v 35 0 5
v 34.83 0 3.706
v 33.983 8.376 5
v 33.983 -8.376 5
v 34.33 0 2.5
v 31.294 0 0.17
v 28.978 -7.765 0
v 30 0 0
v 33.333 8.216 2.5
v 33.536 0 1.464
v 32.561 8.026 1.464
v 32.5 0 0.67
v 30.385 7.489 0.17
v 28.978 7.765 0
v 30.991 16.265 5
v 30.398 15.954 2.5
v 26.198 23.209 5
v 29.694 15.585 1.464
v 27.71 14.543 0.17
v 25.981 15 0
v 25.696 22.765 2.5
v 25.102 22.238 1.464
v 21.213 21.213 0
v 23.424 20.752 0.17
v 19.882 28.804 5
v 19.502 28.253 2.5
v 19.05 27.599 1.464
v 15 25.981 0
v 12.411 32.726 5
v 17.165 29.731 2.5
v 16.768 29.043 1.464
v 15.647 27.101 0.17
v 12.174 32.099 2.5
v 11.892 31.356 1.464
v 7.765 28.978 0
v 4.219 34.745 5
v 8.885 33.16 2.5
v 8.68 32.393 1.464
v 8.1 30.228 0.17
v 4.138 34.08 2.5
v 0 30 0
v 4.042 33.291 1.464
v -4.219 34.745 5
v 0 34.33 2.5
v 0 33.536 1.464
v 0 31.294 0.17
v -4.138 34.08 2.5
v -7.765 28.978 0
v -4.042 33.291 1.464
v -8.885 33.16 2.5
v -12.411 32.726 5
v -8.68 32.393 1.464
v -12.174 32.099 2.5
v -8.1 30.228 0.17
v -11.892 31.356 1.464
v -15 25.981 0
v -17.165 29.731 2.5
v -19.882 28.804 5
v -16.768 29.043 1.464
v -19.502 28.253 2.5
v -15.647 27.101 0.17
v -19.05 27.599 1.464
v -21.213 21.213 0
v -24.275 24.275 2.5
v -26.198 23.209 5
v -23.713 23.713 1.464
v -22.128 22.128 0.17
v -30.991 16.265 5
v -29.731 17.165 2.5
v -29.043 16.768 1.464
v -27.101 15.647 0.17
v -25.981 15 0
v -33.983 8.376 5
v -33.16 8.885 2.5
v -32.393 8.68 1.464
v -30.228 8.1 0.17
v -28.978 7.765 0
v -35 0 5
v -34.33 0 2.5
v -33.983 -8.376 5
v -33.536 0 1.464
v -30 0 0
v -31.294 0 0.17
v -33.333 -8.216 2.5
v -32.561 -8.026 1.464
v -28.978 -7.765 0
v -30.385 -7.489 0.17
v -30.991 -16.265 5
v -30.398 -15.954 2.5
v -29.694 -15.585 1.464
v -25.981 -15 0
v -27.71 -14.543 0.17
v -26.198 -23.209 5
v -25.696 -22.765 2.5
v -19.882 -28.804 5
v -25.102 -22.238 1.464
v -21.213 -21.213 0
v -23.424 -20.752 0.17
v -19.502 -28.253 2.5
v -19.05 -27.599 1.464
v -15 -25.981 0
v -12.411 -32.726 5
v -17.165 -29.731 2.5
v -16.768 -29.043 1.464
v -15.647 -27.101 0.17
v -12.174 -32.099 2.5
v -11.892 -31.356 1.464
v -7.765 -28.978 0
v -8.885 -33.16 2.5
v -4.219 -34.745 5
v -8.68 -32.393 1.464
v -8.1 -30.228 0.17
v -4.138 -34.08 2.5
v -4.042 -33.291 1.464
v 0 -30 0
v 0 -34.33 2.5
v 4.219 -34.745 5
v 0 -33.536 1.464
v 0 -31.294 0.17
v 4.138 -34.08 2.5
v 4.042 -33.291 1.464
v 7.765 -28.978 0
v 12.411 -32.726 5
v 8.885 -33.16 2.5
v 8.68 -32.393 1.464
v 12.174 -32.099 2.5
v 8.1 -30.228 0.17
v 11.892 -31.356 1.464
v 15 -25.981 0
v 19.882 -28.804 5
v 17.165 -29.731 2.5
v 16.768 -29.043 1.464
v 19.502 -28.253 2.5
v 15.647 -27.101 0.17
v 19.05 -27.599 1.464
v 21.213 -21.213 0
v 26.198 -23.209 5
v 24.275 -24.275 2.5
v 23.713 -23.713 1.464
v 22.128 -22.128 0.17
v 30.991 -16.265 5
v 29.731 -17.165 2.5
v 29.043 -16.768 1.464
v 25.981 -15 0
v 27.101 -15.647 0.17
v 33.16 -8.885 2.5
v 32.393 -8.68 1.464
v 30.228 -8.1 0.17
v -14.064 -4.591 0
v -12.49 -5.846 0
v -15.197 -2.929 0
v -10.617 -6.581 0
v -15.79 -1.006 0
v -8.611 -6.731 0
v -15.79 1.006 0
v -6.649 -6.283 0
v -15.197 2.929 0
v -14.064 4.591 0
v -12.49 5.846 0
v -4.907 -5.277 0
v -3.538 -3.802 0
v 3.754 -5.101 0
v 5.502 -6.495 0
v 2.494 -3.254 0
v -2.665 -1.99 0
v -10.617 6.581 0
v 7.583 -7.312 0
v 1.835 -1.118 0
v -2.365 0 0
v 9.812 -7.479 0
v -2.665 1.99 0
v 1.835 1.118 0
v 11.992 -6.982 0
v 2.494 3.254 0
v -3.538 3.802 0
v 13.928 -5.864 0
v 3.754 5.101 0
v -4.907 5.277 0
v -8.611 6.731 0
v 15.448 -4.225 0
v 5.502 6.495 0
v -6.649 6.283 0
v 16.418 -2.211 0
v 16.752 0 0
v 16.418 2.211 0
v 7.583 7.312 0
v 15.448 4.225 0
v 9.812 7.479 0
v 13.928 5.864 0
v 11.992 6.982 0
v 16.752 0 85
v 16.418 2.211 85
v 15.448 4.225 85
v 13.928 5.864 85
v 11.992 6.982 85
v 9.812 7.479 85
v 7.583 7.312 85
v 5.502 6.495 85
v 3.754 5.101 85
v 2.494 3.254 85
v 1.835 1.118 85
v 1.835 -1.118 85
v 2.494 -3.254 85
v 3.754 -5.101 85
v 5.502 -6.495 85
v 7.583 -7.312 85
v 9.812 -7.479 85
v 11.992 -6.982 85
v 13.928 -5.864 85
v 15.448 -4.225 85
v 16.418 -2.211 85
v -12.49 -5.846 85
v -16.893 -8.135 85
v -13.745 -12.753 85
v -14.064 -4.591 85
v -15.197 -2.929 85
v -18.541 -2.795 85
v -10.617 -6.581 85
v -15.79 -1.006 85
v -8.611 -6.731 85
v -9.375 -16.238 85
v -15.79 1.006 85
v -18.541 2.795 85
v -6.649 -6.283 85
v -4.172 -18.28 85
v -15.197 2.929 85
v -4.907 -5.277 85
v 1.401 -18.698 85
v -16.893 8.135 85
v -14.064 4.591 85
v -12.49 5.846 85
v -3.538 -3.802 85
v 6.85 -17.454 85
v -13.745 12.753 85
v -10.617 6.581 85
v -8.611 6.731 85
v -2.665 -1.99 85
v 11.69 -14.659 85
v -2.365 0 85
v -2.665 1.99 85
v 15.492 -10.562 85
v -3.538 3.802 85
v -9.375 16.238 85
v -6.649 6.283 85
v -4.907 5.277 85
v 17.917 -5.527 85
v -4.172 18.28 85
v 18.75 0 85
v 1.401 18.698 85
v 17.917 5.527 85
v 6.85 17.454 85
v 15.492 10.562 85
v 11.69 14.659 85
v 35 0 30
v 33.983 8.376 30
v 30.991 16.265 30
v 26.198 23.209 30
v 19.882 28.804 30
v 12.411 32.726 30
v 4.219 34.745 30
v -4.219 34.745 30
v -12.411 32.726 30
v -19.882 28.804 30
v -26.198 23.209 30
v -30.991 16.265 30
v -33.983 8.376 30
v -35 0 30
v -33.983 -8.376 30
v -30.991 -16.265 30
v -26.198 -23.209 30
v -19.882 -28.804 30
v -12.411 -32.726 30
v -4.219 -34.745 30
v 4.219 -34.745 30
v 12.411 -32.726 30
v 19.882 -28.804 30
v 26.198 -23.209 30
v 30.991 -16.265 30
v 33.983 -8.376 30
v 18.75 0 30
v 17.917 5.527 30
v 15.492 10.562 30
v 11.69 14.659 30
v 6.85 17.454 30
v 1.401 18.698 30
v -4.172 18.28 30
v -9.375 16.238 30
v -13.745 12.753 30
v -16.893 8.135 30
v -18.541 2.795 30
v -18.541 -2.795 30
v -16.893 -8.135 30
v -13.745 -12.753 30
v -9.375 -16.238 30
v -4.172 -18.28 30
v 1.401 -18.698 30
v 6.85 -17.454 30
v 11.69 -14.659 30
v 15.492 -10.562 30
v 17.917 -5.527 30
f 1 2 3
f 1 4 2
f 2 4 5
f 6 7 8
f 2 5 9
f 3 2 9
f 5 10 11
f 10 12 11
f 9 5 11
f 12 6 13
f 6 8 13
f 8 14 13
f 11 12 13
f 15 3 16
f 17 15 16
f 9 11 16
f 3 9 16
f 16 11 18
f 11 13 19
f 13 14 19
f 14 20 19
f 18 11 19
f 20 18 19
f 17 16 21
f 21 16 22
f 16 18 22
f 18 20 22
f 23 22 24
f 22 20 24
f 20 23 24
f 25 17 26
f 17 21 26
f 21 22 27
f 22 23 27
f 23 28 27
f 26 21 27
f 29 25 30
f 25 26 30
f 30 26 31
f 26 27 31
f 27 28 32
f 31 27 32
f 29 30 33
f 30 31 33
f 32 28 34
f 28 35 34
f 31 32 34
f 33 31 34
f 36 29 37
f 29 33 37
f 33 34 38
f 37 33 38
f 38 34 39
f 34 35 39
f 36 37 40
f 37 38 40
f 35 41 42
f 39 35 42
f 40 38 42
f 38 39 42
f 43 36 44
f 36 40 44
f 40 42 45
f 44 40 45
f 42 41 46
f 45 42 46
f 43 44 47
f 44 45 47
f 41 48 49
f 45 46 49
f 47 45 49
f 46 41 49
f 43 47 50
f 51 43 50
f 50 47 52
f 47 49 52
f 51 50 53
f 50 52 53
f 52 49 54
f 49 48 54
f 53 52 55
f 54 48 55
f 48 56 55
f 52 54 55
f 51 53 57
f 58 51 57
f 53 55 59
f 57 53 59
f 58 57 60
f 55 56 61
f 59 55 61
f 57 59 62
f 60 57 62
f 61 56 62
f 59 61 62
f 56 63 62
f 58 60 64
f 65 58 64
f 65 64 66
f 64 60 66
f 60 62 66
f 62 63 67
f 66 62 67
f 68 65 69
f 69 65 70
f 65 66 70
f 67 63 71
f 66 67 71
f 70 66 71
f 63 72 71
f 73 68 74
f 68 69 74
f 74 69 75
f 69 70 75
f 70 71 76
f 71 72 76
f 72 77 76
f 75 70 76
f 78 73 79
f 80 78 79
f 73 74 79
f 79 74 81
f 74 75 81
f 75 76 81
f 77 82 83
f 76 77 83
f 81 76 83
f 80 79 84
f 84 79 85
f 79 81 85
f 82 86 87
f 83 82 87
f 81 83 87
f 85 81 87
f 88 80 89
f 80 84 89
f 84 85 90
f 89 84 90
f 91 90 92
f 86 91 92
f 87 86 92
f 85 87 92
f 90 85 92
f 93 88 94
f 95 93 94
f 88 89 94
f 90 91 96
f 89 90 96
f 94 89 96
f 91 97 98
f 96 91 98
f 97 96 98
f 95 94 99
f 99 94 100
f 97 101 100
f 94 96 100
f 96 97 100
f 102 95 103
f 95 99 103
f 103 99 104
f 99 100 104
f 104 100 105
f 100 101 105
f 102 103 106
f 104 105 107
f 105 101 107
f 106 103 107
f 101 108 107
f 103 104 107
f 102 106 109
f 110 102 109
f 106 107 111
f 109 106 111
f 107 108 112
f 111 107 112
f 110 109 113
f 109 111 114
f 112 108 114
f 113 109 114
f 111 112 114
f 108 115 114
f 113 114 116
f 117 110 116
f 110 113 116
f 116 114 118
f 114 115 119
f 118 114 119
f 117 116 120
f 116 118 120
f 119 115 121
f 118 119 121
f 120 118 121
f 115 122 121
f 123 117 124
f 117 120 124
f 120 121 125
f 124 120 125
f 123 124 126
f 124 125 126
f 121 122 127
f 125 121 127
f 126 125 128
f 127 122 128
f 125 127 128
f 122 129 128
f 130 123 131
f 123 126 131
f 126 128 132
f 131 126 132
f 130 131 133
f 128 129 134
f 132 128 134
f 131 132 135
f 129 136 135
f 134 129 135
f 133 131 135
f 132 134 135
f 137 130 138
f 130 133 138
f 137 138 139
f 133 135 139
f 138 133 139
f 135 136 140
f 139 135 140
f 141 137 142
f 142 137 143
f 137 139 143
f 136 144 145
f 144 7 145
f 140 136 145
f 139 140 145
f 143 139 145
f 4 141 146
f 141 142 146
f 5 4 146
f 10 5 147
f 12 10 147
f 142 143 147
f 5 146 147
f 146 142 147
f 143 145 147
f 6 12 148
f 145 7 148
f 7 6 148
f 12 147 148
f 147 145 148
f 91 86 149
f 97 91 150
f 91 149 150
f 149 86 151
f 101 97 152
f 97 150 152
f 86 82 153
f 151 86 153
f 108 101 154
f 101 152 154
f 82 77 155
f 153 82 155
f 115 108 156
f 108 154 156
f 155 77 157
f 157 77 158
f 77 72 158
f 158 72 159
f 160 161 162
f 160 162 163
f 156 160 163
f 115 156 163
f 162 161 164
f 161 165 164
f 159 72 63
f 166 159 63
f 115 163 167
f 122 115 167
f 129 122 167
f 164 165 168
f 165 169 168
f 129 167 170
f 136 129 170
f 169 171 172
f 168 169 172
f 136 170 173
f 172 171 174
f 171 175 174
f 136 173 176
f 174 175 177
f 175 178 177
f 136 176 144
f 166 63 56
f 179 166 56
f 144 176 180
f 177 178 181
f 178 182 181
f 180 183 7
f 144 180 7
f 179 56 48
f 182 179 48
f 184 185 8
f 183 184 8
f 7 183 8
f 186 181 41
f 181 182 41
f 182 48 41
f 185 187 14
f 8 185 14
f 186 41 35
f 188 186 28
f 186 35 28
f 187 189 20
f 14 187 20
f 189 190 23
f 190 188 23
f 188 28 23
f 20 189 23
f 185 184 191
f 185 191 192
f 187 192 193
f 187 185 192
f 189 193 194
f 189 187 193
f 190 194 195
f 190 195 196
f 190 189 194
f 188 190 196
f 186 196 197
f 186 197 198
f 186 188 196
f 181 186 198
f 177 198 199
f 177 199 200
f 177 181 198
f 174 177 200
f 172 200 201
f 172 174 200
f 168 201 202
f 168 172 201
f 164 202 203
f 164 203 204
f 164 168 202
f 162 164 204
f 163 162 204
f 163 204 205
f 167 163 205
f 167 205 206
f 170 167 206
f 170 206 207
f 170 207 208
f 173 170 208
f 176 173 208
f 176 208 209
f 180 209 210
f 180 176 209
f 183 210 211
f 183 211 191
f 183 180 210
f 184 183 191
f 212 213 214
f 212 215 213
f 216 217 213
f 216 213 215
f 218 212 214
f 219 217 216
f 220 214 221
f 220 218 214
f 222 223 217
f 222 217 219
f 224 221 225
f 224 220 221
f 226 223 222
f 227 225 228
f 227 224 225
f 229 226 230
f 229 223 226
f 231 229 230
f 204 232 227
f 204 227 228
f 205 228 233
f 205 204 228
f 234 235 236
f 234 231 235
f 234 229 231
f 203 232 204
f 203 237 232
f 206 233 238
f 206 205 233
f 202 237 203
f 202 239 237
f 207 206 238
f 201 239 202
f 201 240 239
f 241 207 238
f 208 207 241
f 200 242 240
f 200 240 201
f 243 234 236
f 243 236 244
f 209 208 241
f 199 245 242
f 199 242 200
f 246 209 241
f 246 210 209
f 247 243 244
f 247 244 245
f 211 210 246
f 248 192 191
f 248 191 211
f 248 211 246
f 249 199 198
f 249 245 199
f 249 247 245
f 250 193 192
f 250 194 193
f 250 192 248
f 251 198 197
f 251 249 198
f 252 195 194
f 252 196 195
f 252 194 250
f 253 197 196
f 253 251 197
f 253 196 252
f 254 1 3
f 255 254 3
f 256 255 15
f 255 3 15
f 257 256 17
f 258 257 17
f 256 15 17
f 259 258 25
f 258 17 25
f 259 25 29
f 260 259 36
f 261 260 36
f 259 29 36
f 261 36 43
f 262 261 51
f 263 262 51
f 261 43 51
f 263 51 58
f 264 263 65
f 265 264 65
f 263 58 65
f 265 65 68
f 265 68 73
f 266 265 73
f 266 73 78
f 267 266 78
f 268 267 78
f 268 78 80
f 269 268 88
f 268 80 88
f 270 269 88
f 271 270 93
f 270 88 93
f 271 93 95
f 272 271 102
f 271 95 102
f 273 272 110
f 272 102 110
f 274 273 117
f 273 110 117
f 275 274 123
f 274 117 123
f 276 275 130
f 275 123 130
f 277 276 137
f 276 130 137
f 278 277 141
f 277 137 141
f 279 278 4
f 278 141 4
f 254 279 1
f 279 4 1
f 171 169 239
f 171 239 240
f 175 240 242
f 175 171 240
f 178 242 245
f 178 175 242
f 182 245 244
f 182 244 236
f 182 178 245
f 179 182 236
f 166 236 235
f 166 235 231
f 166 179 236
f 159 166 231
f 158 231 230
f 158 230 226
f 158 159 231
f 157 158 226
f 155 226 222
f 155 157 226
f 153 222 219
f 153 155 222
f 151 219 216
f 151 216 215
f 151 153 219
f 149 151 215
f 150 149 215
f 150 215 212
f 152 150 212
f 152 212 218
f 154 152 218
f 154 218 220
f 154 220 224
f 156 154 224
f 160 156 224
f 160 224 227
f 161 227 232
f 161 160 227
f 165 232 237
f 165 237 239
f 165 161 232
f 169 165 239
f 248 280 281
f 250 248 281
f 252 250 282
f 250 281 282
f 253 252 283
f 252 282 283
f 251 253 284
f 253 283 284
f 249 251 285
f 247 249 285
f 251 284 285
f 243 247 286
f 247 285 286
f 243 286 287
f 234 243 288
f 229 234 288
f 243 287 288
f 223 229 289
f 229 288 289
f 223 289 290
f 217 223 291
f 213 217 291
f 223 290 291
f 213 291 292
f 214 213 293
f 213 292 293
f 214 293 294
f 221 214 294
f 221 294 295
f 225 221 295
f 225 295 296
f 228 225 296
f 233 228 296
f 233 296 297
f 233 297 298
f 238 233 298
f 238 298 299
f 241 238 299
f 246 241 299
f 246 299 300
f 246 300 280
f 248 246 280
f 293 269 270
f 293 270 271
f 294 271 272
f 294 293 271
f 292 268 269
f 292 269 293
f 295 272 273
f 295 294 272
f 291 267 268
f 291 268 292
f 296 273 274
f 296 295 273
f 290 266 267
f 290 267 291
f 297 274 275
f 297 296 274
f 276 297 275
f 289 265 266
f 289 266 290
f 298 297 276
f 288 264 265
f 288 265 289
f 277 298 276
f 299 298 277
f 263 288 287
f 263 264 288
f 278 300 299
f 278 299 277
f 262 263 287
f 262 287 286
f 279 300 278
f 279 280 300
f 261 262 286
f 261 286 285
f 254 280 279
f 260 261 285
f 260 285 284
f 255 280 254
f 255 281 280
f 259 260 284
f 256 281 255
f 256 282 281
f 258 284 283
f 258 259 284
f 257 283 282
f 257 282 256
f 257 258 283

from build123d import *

# Parameters (mm, degrees)
F0_R     = 35
F0_R_2   = 18.75
F1_DEPTH = 30
F0_R_3   = 6.75
F0_R_4   = 7.5
F2_DEPTH = 85
F3_R     = 5


with BuildPart() as f1:
    # F0 (on Top) → F1 (new body)
    with BuildSketch(Plane.XY):
        Circle(F0_R)
        Circle(F0_R_2, mode=Mode.SUBTRACT)
    extrude(amount=F1_DEPTH)

    # F0 (on Top) → F2 (join)
    with BuildSketch(Plane.XY):
        Circle(F0_R_2)
        with Locations((-9.115429, 0)):
            Circle(F0_R_3, mode=Mode.SUBTRACT)
        with Locations((9.25153, 0)):
            Circle(F0_R_4, mode=Mode.SUBTRACT)
    extrude(amount=F2_DEPTH)

    # F3
    f3_edges = [f1.edges().sort_by_distance(p)[0] for p in [
        (-35, 0, 0),
    ]]
    fillet(f3_edges, radius=F3_R)


solid = f1.part
